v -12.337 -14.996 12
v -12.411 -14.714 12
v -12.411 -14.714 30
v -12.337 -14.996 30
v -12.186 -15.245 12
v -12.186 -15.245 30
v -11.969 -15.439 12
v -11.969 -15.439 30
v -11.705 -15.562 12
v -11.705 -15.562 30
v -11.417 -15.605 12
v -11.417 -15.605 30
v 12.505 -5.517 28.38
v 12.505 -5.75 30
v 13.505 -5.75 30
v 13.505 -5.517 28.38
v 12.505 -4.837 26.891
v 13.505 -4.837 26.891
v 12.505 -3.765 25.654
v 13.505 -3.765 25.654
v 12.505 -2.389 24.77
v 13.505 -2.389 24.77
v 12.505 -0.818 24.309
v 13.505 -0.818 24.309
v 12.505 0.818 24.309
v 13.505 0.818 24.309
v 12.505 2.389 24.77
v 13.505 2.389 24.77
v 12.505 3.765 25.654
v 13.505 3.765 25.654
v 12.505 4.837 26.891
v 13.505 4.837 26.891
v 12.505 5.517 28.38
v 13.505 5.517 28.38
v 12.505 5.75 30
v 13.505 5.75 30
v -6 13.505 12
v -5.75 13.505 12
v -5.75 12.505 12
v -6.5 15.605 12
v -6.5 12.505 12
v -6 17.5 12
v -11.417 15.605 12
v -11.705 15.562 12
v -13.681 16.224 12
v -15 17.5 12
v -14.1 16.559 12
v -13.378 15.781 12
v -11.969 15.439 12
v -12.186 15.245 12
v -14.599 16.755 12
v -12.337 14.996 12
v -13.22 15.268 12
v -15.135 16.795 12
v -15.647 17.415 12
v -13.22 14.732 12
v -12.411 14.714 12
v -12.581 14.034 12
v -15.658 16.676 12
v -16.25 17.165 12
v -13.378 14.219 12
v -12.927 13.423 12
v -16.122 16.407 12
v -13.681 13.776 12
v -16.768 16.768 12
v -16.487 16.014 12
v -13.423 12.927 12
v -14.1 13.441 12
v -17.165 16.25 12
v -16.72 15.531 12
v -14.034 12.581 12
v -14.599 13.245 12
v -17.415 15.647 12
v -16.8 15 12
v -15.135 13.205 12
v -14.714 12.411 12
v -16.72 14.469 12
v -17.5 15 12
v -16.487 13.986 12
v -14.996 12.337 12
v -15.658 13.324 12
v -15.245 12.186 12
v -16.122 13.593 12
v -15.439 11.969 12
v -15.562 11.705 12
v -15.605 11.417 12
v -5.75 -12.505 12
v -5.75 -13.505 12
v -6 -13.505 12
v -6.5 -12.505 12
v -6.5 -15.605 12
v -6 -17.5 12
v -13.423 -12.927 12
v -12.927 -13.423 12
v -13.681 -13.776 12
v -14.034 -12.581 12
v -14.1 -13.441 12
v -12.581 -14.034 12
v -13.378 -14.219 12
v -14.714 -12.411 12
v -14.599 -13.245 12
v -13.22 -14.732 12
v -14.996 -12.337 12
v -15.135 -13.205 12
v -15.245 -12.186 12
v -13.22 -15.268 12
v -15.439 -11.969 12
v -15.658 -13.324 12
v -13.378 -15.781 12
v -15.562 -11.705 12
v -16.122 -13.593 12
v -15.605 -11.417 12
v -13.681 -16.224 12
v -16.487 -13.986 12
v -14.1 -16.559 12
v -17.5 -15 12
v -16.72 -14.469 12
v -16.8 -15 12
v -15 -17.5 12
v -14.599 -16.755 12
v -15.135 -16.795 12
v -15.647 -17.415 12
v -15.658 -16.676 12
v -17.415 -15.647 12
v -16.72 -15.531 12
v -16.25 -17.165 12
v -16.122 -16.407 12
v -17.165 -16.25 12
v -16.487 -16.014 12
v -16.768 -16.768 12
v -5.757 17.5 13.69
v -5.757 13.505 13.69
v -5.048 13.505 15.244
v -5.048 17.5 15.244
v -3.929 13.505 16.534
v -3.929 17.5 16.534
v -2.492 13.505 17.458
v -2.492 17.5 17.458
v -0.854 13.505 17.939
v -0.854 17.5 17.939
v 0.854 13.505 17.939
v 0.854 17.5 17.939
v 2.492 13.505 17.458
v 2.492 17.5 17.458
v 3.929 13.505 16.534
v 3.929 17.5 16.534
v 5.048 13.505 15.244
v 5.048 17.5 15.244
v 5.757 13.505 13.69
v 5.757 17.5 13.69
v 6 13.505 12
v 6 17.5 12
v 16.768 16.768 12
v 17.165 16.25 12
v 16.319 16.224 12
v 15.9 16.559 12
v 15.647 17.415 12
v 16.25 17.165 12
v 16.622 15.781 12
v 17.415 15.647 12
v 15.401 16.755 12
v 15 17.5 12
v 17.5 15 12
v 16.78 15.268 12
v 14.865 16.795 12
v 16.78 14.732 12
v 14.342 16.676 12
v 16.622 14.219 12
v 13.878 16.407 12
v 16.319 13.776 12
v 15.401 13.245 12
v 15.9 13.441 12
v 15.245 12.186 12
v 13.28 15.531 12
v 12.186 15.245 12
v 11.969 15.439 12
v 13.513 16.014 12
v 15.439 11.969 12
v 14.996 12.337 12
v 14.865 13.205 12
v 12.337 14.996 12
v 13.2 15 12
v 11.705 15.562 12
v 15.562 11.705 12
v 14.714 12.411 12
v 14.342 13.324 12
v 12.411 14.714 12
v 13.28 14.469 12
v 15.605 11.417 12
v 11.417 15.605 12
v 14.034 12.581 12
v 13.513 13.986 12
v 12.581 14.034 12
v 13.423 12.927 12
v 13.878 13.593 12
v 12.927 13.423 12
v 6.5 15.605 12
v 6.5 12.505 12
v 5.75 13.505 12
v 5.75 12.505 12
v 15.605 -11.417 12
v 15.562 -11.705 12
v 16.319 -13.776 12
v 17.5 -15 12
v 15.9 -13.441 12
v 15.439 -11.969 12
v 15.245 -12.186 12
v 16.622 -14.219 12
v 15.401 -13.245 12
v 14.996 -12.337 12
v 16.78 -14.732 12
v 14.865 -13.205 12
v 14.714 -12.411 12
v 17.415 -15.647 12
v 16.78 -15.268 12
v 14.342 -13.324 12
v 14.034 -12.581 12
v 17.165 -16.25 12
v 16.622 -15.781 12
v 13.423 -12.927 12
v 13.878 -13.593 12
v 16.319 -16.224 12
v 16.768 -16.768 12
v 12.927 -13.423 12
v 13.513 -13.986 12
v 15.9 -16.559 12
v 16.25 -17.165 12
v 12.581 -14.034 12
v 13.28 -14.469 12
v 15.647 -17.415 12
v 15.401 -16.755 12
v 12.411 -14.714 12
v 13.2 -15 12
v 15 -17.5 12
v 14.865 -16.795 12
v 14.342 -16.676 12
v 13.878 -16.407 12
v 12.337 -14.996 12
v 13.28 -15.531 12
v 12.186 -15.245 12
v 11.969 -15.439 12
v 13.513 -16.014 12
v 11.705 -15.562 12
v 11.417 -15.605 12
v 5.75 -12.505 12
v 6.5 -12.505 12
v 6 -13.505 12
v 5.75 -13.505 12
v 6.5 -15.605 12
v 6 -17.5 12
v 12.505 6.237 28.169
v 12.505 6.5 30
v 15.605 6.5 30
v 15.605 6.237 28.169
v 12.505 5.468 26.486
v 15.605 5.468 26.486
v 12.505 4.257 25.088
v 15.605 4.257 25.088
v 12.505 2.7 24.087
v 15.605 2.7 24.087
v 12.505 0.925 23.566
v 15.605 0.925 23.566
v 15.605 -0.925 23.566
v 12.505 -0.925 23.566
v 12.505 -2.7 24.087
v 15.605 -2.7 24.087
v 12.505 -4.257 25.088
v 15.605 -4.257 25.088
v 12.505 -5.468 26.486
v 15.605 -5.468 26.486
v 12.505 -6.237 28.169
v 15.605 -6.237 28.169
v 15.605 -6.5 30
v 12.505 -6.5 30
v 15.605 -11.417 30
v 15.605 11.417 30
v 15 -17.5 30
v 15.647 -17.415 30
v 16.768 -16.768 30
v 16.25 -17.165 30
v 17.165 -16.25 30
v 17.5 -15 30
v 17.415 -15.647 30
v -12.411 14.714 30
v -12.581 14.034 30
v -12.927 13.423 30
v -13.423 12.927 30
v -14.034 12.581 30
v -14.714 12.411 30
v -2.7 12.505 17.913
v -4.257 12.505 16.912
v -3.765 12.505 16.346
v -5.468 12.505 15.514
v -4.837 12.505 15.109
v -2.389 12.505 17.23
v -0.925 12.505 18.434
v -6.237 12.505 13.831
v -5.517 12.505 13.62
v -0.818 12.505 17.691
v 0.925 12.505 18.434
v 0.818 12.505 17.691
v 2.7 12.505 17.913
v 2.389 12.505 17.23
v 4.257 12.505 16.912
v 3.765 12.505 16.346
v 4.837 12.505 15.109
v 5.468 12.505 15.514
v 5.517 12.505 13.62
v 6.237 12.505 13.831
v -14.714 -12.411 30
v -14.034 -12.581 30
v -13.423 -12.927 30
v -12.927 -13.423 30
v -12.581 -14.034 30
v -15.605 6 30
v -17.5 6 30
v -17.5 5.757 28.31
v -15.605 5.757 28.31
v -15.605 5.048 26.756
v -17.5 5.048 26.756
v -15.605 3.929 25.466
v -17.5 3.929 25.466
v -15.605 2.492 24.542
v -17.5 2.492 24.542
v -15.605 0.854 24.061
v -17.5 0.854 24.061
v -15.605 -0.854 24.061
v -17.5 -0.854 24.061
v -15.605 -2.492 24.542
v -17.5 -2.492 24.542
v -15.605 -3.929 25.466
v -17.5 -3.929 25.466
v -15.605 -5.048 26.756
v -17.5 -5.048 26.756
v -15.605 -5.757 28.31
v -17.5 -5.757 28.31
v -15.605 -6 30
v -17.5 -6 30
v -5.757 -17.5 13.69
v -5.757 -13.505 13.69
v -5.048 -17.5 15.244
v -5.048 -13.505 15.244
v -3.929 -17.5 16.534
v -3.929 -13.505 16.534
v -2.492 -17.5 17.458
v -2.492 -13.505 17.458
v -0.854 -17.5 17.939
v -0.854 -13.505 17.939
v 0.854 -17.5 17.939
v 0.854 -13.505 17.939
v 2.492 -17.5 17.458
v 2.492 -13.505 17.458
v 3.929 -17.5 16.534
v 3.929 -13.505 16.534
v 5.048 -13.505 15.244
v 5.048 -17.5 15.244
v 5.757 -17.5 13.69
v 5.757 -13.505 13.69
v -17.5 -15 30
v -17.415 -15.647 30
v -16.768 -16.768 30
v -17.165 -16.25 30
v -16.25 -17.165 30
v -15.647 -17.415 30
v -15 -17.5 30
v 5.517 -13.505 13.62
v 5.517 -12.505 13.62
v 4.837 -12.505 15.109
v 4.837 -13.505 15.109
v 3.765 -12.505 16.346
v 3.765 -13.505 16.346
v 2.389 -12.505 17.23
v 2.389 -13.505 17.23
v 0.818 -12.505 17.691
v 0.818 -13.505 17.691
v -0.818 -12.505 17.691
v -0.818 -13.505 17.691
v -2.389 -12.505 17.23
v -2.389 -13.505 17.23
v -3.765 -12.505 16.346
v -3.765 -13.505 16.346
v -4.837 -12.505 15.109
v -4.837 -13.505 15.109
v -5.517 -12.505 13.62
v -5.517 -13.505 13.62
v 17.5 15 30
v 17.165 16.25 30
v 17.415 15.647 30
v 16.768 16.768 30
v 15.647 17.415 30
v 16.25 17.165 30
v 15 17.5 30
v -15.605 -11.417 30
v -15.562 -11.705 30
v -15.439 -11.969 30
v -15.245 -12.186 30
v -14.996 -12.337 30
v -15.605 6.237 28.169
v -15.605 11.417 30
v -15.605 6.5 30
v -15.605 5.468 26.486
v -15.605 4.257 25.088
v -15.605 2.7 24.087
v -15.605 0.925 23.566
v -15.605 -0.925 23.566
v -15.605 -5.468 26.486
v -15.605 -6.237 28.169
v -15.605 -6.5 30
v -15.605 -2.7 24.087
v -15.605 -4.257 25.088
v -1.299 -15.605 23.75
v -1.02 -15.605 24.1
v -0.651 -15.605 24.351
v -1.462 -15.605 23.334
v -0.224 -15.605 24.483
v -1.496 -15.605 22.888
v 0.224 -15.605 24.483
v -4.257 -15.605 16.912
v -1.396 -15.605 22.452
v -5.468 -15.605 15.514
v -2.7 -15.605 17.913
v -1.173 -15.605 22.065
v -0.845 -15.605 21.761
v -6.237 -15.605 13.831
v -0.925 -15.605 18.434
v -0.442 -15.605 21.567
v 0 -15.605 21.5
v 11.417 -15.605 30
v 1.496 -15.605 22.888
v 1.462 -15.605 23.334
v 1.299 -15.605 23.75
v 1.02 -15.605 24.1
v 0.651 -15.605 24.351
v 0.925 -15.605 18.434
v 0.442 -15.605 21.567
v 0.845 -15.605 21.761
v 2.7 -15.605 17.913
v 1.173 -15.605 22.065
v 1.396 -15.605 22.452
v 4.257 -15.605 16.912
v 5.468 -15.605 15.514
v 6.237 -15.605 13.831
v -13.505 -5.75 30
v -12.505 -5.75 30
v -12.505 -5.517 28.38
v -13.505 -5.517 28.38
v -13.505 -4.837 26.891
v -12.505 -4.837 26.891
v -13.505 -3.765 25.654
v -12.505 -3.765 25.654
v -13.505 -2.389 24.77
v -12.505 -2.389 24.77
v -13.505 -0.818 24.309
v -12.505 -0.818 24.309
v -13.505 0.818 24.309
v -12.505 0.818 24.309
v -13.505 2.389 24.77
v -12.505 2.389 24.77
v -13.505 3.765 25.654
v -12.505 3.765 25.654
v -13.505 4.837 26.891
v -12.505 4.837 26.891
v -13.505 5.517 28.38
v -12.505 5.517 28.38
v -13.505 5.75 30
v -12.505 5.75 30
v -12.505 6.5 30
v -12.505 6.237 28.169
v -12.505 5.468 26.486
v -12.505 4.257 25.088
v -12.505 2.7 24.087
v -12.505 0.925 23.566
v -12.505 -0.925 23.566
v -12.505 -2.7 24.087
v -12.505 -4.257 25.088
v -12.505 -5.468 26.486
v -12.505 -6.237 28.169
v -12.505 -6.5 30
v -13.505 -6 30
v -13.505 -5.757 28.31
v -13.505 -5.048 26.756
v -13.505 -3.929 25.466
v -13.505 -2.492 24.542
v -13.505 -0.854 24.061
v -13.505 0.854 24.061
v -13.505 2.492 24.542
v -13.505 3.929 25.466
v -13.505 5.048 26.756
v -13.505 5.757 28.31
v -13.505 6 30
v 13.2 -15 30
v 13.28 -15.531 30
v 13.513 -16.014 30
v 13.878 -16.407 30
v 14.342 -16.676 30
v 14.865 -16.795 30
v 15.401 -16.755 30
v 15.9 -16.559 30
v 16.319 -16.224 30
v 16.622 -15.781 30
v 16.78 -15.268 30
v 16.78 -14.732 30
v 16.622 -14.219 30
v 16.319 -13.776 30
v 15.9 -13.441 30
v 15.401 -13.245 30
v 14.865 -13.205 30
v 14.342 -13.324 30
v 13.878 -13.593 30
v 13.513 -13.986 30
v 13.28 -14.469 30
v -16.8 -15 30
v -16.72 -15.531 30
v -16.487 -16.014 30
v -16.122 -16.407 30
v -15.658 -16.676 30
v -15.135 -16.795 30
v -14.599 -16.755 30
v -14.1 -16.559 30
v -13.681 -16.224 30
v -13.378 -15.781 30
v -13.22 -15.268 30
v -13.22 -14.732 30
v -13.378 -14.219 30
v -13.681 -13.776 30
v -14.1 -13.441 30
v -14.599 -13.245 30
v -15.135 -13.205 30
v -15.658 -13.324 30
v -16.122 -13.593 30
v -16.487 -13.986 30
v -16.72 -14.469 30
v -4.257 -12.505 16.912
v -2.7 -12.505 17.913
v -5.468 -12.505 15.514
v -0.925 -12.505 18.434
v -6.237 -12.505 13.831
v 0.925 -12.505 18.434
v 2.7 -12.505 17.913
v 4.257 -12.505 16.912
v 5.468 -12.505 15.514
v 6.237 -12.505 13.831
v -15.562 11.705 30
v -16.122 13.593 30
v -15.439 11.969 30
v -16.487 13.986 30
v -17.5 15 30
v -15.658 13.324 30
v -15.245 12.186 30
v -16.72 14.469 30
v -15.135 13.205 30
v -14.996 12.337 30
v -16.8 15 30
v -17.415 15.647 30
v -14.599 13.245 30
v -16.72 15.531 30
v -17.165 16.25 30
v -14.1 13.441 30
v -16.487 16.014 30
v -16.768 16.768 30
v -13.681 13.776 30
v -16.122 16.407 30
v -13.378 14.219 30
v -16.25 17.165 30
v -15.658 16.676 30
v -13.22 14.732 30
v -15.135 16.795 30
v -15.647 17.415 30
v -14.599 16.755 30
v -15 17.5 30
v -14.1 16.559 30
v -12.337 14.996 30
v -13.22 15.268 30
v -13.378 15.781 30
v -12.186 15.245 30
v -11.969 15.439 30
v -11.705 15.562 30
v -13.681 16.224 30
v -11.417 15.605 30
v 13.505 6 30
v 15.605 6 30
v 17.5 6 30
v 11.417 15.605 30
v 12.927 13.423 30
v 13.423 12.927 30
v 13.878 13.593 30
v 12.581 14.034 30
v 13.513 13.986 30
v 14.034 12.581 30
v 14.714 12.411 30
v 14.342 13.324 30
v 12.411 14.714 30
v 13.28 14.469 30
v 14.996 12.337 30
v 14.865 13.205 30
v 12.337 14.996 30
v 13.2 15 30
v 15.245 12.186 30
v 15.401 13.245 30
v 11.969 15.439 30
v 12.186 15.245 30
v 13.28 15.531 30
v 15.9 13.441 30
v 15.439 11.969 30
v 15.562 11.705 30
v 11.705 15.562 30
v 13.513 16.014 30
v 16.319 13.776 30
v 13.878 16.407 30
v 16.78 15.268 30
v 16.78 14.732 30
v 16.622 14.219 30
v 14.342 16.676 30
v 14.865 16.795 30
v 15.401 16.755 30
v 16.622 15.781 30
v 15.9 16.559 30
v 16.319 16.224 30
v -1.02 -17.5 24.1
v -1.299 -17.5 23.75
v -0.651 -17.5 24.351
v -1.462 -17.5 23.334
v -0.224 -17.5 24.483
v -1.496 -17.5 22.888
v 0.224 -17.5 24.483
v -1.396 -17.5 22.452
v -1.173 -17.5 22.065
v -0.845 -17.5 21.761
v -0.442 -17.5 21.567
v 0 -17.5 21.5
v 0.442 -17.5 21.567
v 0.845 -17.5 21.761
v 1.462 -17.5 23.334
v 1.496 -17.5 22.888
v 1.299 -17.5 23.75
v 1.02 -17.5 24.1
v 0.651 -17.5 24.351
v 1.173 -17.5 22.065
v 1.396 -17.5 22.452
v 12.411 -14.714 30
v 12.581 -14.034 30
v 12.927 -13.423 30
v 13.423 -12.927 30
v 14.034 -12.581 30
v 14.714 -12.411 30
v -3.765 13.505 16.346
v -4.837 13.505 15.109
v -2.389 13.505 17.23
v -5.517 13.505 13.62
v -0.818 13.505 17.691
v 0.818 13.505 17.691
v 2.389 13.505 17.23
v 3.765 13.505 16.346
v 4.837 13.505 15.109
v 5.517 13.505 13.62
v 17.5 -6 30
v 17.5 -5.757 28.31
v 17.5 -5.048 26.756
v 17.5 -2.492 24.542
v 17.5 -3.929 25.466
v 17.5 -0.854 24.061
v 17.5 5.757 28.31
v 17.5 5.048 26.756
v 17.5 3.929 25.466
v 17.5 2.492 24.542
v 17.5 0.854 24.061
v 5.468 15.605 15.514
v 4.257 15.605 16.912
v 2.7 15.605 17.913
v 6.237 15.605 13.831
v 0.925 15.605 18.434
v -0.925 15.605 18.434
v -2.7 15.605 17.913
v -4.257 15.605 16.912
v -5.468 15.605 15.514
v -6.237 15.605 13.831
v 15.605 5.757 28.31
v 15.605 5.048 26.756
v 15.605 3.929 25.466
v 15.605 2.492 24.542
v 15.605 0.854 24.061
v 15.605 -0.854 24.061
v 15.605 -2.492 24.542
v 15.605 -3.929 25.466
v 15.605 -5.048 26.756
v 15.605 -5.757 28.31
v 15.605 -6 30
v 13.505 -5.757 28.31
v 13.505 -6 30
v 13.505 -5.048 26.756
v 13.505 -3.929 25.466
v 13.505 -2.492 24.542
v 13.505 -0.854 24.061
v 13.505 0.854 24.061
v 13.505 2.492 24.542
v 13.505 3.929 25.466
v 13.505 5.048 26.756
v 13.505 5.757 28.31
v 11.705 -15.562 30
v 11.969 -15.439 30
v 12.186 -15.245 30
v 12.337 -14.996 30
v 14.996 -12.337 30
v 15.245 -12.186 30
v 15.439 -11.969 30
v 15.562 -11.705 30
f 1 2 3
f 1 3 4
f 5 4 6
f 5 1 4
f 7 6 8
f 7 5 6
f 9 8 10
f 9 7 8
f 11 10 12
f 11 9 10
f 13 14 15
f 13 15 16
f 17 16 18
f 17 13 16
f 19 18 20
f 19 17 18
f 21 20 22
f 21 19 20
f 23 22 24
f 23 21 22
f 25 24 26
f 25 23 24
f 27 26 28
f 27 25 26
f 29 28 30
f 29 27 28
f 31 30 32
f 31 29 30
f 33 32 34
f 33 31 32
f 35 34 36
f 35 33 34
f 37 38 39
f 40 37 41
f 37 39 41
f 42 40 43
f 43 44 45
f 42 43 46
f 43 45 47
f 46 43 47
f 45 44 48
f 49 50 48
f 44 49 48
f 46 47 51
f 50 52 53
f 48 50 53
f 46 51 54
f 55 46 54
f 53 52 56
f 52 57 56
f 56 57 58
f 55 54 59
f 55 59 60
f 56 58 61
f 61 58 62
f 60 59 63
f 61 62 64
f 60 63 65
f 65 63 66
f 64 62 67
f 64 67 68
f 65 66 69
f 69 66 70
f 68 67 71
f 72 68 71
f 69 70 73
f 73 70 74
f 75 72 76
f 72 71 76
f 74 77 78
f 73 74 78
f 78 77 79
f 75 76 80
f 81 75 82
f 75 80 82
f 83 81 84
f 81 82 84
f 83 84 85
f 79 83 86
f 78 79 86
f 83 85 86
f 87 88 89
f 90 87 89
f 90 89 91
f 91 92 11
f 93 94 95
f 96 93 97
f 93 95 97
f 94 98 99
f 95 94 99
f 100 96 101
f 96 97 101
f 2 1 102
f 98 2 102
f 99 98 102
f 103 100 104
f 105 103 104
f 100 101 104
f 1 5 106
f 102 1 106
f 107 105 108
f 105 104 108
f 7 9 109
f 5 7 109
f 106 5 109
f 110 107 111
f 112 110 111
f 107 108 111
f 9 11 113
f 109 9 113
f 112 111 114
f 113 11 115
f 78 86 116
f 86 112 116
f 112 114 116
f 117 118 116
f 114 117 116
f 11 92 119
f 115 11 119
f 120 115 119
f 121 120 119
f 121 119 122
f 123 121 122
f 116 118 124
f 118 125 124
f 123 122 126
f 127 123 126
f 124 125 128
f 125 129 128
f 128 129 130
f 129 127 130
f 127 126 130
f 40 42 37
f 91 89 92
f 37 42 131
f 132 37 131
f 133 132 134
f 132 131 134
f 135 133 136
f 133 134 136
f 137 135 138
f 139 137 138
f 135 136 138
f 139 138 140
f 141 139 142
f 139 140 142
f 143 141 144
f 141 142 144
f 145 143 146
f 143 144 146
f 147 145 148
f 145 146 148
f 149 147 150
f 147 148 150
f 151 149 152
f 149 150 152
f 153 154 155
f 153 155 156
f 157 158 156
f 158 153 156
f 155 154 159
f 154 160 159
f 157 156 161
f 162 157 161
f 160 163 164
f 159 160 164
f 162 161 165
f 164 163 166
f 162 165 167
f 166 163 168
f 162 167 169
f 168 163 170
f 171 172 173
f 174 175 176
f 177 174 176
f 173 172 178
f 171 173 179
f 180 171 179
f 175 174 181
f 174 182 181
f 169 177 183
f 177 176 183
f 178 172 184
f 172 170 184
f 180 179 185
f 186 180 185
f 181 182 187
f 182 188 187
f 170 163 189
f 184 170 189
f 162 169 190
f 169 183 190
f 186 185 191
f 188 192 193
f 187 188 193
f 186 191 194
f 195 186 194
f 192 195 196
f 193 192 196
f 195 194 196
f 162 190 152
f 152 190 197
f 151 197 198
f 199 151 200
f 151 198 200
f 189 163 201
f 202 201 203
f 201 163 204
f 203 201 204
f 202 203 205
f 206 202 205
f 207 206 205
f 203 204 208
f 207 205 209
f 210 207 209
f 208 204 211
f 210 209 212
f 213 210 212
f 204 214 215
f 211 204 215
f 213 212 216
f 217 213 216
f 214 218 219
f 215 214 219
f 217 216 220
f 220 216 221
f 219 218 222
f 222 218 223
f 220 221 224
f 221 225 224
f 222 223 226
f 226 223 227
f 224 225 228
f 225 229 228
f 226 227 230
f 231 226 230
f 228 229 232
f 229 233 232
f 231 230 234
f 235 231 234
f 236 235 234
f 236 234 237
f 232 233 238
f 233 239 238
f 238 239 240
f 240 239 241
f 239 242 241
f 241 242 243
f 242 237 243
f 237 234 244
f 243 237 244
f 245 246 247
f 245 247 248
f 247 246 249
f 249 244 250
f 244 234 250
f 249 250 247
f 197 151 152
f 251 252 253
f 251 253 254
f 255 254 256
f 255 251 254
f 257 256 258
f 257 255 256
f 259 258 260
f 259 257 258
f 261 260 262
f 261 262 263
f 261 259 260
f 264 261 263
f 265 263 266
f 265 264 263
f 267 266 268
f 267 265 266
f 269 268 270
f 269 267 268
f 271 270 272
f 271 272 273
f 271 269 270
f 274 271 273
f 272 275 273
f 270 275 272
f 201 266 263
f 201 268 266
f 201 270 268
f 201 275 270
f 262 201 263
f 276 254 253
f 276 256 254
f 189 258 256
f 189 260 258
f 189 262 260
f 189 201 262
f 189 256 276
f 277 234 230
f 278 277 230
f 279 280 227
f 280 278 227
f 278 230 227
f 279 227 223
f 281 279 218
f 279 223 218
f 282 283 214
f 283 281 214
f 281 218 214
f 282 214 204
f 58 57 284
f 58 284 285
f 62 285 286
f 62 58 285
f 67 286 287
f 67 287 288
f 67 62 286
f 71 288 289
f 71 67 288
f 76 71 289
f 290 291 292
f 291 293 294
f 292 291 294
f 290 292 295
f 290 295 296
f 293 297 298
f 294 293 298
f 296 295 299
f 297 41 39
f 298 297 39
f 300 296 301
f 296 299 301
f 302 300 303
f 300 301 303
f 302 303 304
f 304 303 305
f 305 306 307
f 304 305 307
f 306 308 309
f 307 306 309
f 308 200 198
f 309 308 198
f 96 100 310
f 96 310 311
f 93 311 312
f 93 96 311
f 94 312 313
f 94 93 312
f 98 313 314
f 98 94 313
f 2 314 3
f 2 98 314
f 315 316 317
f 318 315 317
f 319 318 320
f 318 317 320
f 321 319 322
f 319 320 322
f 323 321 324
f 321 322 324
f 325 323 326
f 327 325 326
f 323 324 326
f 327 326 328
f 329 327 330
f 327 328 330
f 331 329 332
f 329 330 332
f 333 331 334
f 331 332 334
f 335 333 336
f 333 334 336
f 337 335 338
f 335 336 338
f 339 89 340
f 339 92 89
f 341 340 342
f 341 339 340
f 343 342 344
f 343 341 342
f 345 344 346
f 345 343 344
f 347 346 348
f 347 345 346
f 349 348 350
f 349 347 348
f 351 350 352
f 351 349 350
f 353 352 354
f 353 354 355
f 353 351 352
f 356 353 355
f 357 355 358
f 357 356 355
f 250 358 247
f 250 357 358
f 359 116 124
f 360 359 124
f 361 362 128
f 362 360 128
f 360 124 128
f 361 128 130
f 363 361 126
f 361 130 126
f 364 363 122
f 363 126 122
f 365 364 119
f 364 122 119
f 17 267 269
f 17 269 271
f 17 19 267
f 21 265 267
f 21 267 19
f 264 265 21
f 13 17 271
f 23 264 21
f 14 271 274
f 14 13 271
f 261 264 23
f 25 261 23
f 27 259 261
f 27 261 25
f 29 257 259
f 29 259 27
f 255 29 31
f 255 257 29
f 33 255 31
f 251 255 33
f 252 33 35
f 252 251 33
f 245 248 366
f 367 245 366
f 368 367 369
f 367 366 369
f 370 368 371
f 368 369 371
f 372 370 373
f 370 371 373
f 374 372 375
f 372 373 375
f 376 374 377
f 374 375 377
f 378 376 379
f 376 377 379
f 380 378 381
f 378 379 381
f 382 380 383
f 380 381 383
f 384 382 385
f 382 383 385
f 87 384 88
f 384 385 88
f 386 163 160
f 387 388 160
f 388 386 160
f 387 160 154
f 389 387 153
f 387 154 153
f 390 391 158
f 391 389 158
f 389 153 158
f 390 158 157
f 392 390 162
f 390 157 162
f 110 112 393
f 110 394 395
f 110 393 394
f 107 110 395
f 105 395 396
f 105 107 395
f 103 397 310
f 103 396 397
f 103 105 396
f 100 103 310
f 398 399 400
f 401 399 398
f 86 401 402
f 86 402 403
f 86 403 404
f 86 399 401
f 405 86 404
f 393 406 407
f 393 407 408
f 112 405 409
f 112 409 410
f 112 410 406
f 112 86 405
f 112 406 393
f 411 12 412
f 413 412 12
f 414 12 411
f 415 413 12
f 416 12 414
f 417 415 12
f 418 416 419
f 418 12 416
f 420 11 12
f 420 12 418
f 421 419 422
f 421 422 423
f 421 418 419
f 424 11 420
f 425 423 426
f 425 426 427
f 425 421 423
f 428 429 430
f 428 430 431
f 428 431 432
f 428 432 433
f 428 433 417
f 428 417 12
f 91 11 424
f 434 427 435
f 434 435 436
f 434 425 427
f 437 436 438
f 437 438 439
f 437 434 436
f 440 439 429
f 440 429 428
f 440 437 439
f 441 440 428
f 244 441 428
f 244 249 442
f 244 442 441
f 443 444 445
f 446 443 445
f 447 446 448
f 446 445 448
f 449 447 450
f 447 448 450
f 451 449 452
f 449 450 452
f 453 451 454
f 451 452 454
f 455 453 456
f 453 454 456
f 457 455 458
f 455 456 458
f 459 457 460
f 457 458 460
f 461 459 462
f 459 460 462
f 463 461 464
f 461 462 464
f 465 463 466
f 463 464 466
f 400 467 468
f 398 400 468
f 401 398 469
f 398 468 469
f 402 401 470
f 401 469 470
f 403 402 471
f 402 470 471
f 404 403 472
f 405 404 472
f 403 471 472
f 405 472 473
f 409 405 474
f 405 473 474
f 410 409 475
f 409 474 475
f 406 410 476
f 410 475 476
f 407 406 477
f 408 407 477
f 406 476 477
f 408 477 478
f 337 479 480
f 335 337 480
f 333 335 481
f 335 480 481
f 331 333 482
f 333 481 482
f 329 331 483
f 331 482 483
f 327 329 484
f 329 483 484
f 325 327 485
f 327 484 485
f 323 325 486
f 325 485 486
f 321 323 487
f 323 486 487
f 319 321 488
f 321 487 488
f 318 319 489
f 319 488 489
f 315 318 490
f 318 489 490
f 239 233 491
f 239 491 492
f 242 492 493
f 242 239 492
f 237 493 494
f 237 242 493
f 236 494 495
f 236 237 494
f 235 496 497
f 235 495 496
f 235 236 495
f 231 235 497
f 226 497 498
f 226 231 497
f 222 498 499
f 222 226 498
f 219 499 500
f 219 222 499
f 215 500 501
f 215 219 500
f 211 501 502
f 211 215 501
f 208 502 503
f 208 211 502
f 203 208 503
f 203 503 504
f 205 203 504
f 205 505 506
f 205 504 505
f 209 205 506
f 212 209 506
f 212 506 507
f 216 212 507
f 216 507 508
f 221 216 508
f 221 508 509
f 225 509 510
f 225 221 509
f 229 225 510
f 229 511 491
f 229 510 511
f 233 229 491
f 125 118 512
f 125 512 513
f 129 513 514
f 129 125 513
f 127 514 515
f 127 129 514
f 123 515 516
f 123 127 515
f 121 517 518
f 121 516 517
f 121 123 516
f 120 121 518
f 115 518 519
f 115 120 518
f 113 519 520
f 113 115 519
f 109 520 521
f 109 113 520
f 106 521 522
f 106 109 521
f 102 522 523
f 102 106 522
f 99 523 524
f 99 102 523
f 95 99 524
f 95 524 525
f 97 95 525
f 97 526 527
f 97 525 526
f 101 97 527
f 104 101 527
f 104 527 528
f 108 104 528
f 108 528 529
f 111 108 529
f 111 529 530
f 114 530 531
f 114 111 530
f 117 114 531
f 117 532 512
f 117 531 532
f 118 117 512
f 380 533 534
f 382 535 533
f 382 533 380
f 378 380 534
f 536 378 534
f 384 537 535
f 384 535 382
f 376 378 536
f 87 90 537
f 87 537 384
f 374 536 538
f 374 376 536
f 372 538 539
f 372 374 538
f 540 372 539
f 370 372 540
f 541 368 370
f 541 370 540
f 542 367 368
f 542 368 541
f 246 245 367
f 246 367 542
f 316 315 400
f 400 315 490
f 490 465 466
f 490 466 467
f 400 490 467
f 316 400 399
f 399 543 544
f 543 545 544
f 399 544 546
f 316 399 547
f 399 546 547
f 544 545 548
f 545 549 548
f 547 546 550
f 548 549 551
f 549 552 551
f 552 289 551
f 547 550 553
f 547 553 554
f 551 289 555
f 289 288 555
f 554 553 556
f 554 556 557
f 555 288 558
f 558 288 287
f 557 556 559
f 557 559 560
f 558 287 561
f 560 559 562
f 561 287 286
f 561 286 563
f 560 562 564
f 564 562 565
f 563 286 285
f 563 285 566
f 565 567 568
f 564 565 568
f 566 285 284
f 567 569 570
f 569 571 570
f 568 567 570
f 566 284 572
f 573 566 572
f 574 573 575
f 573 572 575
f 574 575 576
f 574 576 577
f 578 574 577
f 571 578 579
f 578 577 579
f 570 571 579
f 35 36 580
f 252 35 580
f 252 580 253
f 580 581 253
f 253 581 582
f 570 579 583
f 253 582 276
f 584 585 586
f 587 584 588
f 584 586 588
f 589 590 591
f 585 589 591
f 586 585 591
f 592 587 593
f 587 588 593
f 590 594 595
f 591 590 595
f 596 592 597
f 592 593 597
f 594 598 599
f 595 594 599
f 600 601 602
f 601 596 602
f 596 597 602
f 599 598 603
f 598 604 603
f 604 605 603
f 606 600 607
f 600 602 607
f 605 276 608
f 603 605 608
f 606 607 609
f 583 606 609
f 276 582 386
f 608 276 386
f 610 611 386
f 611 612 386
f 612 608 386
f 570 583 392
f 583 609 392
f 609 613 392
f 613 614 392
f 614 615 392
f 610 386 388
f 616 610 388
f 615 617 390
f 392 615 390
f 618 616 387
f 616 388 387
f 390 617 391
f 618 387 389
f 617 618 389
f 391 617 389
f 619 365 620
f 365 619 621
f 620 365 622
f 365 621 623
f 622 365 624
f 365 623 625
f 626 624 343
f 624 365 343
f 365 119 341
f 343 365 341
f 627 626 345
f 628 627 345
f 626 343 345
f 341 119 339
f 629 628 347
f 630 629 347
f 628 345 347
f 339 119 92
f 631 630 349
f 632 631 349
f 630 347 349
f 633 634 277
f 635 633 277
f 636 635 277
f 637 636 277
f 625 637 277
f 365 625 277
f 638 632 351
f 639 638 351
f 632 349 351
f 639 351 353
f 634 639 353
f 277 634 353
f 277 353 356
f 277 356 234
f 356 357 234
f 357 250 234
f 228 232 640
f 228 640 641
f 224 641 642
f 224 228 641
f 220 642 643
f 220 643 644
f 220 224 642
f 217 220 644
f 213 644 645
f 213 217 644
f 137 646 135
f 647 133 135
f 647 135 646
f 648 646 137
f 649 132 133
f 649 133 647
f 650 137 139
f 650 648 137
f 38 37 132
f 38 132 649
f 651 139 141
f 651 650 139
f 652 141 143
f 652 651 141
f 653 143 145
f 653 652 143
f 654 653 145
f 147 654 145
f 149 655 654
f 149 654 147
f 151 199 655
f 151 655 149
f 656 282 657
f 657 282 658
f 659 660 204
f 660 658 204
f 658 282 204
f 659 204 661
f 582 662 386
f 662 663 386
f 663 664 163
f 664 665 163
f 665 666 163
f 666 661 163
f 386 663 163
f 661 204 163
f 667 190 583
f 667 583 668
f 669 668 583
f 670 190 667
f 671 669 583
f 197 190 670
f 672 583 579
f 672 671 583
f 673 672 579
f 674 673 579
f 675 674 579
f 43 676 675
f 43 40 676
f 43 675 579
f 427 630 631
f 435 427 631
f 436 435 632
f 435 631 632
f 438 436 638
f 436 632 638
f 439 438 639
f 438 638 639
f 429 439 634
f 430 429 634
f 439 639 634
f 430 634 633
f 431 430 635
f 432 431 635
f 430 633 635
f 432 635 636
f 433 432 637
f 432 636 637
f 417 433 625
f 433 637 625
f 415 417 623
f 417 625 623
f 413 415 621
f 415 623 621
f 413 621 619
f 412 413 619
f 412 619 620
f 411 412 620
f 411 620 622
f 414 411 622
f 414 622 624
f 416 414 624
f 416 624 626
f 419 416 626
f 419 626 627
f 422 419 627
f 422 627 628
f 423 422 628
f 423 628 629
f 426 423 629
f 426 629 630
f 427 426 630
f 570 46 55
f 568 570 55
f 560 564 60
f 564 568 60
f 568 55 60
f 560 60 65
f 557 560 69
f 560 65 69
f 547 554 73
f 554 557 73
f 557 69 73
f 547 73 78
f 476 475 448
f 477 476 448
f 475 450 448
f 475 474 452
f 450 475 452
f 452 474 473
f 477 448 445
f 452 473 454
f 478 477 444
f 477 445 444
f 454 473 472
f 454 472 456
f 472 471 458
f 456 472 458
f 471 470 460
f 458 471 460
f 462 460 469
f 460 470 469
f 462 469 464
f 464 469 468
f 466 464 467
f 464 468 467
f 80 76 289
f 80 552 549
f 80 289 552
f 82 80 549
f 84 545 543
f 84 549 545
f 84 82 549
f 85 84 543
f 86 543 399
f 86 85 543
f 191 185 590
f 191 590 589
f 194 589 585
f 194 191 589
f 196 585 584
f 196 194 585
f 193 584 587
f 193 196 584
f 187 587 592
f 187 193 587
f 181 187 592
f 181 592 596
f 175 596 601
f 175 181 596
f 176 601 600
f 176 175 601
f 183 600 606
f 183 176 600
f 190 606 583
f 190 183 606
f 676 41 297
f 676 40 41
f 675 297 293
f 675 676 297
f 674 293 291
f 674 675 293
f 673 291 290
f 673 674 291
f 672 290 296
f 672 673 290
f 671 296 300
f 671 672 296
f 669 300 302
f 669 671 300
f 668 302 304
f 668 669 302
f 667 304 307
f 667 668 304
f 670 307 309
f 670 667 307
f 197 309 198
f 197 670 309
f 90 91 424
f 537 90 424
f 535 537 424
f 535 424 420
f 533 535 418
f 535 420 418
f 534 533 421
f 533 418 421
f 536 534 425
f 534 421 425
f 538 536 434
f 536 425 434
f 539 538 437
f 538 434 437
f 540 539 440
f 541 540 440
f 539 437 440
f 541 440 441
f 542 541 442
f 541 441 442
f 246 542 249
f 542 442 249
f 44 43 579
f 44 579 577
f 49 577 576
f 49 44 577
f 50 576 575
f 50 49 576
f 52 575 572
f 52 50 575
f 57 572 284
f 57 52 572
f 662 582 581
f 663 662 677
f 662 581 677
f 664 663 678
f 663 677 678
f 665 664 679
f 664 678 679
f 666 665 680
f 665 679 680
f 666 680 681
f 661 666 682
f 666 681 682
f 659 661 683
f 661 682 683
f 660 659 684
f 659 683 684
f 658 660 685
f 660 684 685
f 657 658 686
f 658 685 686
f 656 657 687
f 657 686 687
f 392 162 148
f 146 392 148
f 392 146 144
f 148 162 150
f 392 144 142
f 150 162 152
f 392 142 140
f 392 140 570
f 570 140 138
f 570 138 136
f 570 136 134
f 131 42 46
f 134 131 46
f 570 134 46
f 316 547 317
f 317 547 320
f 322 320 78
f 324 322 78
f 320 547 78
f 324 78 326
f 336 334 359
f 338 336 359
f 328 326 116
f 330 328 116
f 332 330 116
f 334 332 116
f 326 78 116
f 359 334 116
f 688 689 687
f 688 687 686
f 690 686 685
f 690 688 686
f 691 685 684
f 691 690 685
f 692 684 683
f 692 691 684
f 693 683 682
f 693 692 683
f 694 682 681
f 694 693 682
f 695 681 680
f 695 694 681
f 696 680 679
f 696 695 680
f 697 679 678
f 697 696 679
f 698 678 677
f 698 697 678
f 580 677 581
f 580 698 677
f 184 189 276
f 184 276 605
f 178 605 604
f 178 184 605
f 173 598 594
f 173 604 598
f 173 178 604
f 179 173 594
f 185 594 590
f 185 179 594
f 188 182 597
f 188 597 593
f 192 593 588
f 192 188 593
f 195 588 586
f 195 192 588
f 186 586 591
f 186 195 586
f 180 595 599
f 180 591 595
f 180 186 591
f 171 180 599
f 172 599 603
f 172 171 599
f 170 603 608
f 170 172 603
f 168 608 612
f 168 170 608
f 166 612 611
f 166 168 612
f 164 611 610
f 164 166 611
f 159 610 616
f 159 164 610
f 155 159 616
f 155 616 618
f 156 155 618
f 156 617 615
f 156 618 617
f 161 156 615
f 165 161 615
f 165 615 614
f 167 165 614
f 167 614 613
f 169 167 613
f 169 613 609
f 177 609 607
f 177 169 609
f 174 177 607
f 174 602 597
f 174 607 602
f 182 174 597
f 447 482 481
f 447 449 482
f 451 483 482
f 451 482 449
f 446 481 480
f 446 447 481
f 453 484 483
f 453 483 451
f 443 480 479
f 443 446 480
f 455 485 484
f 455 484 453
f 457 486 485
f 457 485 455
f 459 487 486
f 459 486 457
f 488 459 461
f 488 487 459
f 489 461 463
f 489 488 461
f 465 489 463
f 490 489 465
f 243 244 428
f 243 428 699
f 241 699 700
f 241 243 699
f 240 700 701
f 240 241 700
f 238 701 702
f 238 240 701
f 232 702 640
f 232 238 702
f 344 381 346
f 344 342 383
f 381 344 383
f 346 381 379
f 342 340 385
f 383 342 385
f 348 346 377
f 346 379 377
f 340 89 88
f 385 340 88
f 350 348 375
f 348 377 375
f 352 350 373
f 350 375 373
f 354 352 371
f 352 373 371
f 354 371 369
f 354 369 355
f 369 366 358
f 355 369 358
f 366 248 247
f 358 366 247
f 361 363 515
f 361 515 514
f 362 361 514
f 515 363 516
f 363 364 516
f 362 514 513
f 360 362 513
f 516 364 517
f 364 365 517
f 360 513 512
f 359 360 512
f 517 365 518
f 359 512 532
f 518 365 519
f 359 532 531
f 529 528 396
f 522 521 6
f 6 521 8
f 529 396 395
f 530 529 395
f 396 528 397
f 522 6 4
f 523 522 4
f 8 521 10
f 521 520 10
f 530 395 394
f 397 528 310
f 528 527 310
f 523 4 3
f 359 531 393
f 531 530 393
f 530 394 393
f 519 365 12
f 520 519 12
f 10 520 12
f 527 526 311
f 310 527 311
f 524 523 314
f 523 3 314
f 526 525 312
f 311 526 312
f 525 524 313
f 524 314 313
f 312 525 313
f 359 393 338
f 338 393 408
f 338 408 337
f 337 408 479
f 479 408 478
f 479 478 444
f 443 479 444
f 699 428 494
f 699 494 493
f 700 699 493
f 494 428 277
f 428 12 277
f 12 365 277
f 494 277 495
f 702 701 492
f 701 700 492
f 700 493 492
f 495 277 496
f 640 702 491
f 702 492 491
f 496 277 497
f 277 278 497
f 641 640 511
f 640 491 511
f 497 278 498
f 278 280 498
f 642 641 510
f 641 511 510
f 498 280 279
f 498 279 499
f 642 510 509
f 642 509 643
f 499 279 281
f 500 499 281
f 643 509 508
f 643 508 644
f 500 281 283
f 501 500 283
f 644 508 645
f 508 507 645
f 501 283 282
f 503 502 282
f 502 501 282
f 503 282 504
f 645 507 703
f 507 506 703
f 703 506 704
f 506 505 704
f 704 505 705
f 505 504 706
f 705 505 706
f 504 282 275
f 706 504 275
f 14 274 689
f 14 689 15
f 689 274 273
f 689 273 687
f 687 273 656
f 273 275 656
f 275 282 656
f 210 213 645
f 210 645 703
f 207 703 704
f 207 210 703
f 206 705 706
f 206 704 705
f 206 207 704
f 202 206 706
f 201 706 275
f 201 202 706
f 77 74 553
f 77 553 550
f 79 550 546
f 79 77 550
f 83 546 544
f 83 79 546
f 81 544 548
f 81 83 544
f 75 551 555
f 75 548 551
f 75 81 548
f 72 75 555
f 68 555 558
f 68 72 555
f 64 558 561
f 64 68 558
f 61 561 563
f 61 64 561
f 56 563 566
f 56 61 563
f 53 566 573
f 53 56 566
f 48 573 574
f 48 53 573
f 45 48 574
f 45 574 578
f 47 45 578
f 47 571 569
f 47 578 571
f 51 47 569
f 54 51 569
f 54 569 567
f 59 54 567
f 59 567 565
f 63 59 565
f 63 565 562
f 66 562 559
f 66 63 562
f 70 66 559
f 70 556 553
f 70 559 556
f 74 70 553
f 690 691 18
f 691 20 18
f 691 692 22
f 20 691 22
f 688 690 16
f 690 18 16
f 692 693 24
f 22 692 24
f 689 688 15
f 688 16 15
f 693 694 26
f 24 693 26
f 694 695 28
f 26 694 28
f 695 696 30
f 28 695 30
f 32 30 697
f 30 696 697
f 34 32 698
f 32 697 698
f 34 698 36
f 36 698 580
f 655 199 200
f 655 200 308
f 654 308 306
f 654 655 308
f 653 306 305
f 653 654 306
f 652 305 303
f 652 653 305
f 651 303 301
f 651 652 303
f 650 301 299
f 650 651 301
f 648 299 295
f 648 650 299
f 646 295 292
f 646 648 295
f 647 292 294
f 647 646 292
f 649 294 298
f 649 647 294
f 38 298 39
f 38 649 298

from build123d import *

# Parameters (mm, degrees)
SKETCH_1_R          = 1.8000000000000025
SKETCH_1_R_2        = 1.8000000000000043
SKETCH_1_R_3        = 1.8000000000000005
SKETCH_1_R_4        = 1.8000000000000007
EXTRUDE_1_DEPTH     = 42
SKETCH_2_R          = 6.000000000000001
CUT_EXTRUDE_1_DEPTH = 58.404268133998535
SKETCH_3_R          = 6.000000000000002
CUT_EXTRUDE_2_DEPTH = 58.404268133998535
SKETCH_5_W          = 12
SKETCH_5_H          = 15.000000000000005
SKETCH_5_H_2        = 15.000000000000002
CUT_EXTRUDE_3_DEPTH = 58.404268133998535
EXTRUDE_2_DEPTH     = 2.1
EXTRUDE_3_DEPTH     = 1
EXTRUDE_START       = 2.1
EXTRUDE_4_DEPTH     = 2.1
EXTRUDE_START_2     = 1
EXTRUDE_5_DEPTH     = 1
SKETCH_10_R         = 1.5000000000000018
CUT_EXTRUDE_4_DEPTH = 3


with BuildPart() as part:
    # 草图1 → 凸台-拉伸1 (new body)
    with BuildSketch(Plane(origin=(0, 0, 0), x_dir=(-1, 0, 0), z_dir=(0, 0, 1))):
        with BuildLine():
            Line((-17.499999999999996, 15), (-17.499999999999996, -15.000000000000007))
            ThreePointArc((-17.499999999999996, -15.000000000000007), (-16.767766952966365, -16.767766952966372), (-15, -17.500000000000007))
            Line((-15, -17.500000000000007), (15.000000000000004, -17.500000000000007))
            ThreePointArc((15.000000000000004, -17.500000000000007), (16.76776695296637, -16.767766952966376), (17.5, -15.00000000000001))
            Line((17.5, -15.00000000000001), (17.5, 14.999999999999996))
            ThreePointArc((17.5, 14.999999999999996), (16.76776695296637, 16.76776695296636), (15.000000000000004, 17.499999999999996))
            Line((15.000000000000004, 17.499999999999996), (-15, 17.499999999999996))
            ThreePointArc((-15, 17.499999999999996), (-16.767766952966365, 16.767766952966365), (-17.499999999999996, 15))
        make_face()
        with Locations((-15.000000000000004, -15.00000000000001)):
            Circle(SKETCH_1_R, mode=Mode.SUBTRACT)
        with Locations((15.000000000000004, -15.00000000000001)):
            Circle(SKETCH_1_R_2, mode=Mode.SUBTRACT)
        with Locations((15.000000000000004, 14.999999999999996)):
            Circle(SKETCH_1_R_3, mode=Mode.SUBTRACT)
        with Locations((-15, 15)):
            Circle(SKETCH_1_R_4, mode=Mode.SUBTRACT)
        with BuildLine():
            Line((15.604722413530899, -11.417049414734192), (15.604722413530899, 11.41704941481964))
            ThreePointArc((15.604722413530899, 11.41704941481964), (15.349600753639777, 12.084241863325458), (14.714404940145743, 12.41098197902667))
            ThreePointArc((14.714404940145743, 12.41098197902667), (13.158183898644735, 13.15818233801838), (12.410982220986185, 14.714402746377065))
            ThreePointArc((12.410982220986185, 14.714402746377065), (12.084242685294747, 15.349600017363324), (11.417049414775391, 15.604722413530212))
            Line((11.417049414775391, 15.604722413530212), (-11.417049414778536, 15.604722413530212))
            ThreePointArc((-11.417049414778536, 15.604722413530212), (-12.084241863278942, 15.349600753643644), (-12.410981978984013, 14.714404940159108))
            ThreePointArc((-12.410981978984013, 14.714404940159108), (-13.158182337972896, 13.158183898648431), (-14.714402746337697, 12.41098222098531))
            ThreePointArc((-14.714402746337697, 12.41098222098531), (-15.34960001732269, 12.084242685293246), (-15.604722413489107, 11.41704941477461))
            Line((-15.604722413489107, 11.41704941477461), (-15.604722413489107, -11.417049414779225))
            ThreePointArc((-15.604722413489107, -11.417049414779225), (-15.349600753597985, -12.084241863285039), (-14.714404940103952, -12.410981978986248))
            ThreePointArc((-14.714404940103952, -12.410981978986248), (-13.158183898602942, -13.158182337977962), (-12.410982220944396, -14.714402746336651))
            ThreePointArc((-12.410982220944396, -14.714402746336651), (-12.084242685252958, -15.34960001732291), (-11.417049414733604, -15.604722413489796))
            Line((-11.417049414733604, -15.604722413489796), (11.417049414820326, -15.604722413489796))
            ThreePointArc((11.417049414820326, -15.604722413489796), (12.084241863320731, -15.349600753603227), (12.410981979025802, -14.714404940118692))
            ThreePointArc((12.410981979025802, -14.714404940118692), (13.158182338014687, -13.158183898608014), (14.71440274637949, -12.410982220944893))
            ThreePointArc((14.71440274637949, -12.410982220944893), (15.34960001736448, -12.084242685252828), (15.604722413530899, -11.417049414734192))
        make_face(mode=Mode.SUBTRACT)
    extrude(amount=EXTRUDE_1_DEPTH)

    # 草图2 → 切除-拉伸1 (cut, through all)
    with BuildSketch(Plane(origin=(0, 17.500000000000007, 0), x_dir=(1, 0, 0), z_dir=(0, 1, 0))):
        with Locations(Location((0, -11.999999999999998, 0), (0, 0, 270))):
            Circle(SKETCH_2_R)
    extrude(amount=-CUT_EXTRUDE_1_DEPTH, mode=Mode.SUBTRACT)

    # 草图3 → 切除-拉伸2 (cut, through all)
    with BuildSketch(Plane.ZY.offset(17.5)):
        with Locations((30, 0)):
            Circle(SKETCH_3_R)
    extrude(amount=-CUT_EXTRUDE_2_DEPTH, mode=Mode.SUBTRACT)

    # 草图5 → 切除-拉伸3 (cut, through all)
    with BuildSketch(Plane(origin=(17.499999999999996, 0, 0), x_dir=(0, 0, -1), z_dir=(1, 0, 0))):
        Polygon((-30, -24.974265818952347), (-30, -15), (-42, -15), (-42, 15.000000000000007), (-30, 15.000000000000007), (-30, 23.87950348168345), (-47.41212790980853, 25.238249525472156), (-47.41212790980853, -24.974265818952347), align=None)
        with BuildLine():
            Line((-42, -15), (-30, -15))
            Line((-30, -15), (-30, -6.000000000000003))
            ThreePointArc((-29.999999999999925, -6.000000000000003), (-36, -1.93e-15), (-29.999999999999932, 6.000000000000003))
            Line((-30, 6.000000000000003), (-30, 15.000000000000007))
            Line((-30, 15.000000000000007), (-42, 15.000000000000007))
            Line((-42, 15.000000000000007), (-42, -15))
        make_face()
        with Locations((-6, 7.500000000000003)):
            Rectangle(SKETCH_5_W, SKETCH_5_H)
        Polygon((0, 15.000000000000007), (0, 0), (0, -15), (-12, -15), (-12, -24.974265818952347), (12.116605042765016, -24.974265818952347), (12.116605042765016, 23.87950348168345), (-12, 23.87950348168345), (-12, 15.000000000000007), align=None)
        with Locations((-6, -7.500000000000001)):
            Rectangle(SKETCH_5_W, SKETCH_5_H_2)
    extrude(amount=-CUT_EXTRUDE_3_DEPTH, mode=Mode.SUBTRACT)

    # 草图6 → 凸台-拉伸2 (add)
    with BuildSketch(Plane(origin=(0, 15.604722413489796, 0), x_dir=(-1, 0, 0), z_dir=(0, -1, 0))):
        with BuildLine():
            Line((-6.000000000000001, -11.999999999999998), (-6.500000000000001, -11.999999999999998))
            ThreePointArc((-6.500000000000001, -11.999999999999998), (-1.19e-15, -18.5), (6.500000000000001, -11.999999999999998))
            Line((6.500000000000001, -11.999999999999998), (6.000000000000001, -11.999999999999998))
            ThreePointArc((6.000000000000001, -11.999999999999998), (-1.1e-15, -18), (-6.000000000000001, -11.999999999999998))
        make_face()
    extrude_2 = extrude(amount=EXTRUDE_2_DEPTH)

    # 草图7 → 凸台-拉伸3 (add)
    with BuildSketch(Plane(origin=(0, 13.504722413489795, 0), x_dir=(-1, 0, 0), z_dir=(0, -1, 0))):
        with BuildLine():
            Line((-6.500000000000002, -11.999999999999998), (-5.750000000000001, -11.999999999999998))
            ThreePointArc((-5.750000000000001, -11.999999999999998), (-1.06e-15, -17.75), (5.750000000000001, -11.999999999999998))
            Line((5.750000000000001, -11.999999999999998), (6.500000000000002, -11.999999999999998))
            ThreePointArc((6.500000000000002, -11.999999999999998), (-1.19e-15, -18.5), (-6.500000000000002, -11.999999999999998))
        make_face()
    extrude_3 = extrude(amount=EXTRUDE_3_DEPTH)

    # 镜向1: 凸台-拉伸2, 凸台-拉伸3 across plane
    add(extrude_2.mirror(Plane(origin=(0, 0, 0), x_dir=(0, 0, 1), z_dir=(0, -1, 0))))
    add(extrude_3.mirror(Plane(origin=(0, 0, 0), x_dir=(0, 0, 1), z_dir=(0, -1, 0))))

    # 草图8 → 凸台-拉伸4 (add)
    with BuildSketch(Plane.ZY.offset(-15.604722413489107).offset(EXTRUDE_START)):
        with BuildLine():
            Line((30, -6.500000000000001), (30, -6.000000000000003))
            ThreePointArc((30, -6.000000000000003), (23.999999999999996, 7.3e-16), (30, 6.000000000000003))
            Line((30, 6.000000000000003), (30, 6.500000000000001))
            ThreePointArc((30, 6.500000000000001), (23.5, 8e-16), (30, -6.500000000000001))
        make_face()
    extrude_4 = extrude(amount=-EXTRUDE_4_DEPTH)

    # 草图9 → 凸台-拉伸5 (add)
    with BuildSketch(Plane.ZY.offset(-13.504722413489107).offset(EXTRUDE_START_2)):
        with BuildLine():
            Line((30, -6.500000000000001), (30, -5.750000000000003))
            ThreePointArc((30, -5.750000000000003), (24.249999999999996, 7e-16), (30, 5.750000000000003))
            Line((30, 5.750000000000003), (30, 6.500000000000001))
            ThreePointArc((30, 6.500000000000001), (23.5, 8e-16), (30, -6.500000000000001))
        make_face()
    extrude_5 = extrude(amount=-EXTRUDE_5_DEPTH)

    # 镜向2: 凸台-拉伸4, 凸台-拉伸5 across plane
    add(extrude_4.mirror(Plane.ZY))
    add(extrude_5.mirror(Plane.ZY))

    # 草图10 → 切除-拉伸4 (cut)
    with BuildSketch(Plane.XZ.offset(17.499999999999996)):
        with Locations(Location((-1.8416814e-09, 23.000000000000025, 0), (0, 0, 270))):
            Circle(SKETCH_10_R)
    extrude(amount=-CUT_EXTRUDE_4_DEPTH, mode=Mode.SUBTRACT)


solid = part.part
